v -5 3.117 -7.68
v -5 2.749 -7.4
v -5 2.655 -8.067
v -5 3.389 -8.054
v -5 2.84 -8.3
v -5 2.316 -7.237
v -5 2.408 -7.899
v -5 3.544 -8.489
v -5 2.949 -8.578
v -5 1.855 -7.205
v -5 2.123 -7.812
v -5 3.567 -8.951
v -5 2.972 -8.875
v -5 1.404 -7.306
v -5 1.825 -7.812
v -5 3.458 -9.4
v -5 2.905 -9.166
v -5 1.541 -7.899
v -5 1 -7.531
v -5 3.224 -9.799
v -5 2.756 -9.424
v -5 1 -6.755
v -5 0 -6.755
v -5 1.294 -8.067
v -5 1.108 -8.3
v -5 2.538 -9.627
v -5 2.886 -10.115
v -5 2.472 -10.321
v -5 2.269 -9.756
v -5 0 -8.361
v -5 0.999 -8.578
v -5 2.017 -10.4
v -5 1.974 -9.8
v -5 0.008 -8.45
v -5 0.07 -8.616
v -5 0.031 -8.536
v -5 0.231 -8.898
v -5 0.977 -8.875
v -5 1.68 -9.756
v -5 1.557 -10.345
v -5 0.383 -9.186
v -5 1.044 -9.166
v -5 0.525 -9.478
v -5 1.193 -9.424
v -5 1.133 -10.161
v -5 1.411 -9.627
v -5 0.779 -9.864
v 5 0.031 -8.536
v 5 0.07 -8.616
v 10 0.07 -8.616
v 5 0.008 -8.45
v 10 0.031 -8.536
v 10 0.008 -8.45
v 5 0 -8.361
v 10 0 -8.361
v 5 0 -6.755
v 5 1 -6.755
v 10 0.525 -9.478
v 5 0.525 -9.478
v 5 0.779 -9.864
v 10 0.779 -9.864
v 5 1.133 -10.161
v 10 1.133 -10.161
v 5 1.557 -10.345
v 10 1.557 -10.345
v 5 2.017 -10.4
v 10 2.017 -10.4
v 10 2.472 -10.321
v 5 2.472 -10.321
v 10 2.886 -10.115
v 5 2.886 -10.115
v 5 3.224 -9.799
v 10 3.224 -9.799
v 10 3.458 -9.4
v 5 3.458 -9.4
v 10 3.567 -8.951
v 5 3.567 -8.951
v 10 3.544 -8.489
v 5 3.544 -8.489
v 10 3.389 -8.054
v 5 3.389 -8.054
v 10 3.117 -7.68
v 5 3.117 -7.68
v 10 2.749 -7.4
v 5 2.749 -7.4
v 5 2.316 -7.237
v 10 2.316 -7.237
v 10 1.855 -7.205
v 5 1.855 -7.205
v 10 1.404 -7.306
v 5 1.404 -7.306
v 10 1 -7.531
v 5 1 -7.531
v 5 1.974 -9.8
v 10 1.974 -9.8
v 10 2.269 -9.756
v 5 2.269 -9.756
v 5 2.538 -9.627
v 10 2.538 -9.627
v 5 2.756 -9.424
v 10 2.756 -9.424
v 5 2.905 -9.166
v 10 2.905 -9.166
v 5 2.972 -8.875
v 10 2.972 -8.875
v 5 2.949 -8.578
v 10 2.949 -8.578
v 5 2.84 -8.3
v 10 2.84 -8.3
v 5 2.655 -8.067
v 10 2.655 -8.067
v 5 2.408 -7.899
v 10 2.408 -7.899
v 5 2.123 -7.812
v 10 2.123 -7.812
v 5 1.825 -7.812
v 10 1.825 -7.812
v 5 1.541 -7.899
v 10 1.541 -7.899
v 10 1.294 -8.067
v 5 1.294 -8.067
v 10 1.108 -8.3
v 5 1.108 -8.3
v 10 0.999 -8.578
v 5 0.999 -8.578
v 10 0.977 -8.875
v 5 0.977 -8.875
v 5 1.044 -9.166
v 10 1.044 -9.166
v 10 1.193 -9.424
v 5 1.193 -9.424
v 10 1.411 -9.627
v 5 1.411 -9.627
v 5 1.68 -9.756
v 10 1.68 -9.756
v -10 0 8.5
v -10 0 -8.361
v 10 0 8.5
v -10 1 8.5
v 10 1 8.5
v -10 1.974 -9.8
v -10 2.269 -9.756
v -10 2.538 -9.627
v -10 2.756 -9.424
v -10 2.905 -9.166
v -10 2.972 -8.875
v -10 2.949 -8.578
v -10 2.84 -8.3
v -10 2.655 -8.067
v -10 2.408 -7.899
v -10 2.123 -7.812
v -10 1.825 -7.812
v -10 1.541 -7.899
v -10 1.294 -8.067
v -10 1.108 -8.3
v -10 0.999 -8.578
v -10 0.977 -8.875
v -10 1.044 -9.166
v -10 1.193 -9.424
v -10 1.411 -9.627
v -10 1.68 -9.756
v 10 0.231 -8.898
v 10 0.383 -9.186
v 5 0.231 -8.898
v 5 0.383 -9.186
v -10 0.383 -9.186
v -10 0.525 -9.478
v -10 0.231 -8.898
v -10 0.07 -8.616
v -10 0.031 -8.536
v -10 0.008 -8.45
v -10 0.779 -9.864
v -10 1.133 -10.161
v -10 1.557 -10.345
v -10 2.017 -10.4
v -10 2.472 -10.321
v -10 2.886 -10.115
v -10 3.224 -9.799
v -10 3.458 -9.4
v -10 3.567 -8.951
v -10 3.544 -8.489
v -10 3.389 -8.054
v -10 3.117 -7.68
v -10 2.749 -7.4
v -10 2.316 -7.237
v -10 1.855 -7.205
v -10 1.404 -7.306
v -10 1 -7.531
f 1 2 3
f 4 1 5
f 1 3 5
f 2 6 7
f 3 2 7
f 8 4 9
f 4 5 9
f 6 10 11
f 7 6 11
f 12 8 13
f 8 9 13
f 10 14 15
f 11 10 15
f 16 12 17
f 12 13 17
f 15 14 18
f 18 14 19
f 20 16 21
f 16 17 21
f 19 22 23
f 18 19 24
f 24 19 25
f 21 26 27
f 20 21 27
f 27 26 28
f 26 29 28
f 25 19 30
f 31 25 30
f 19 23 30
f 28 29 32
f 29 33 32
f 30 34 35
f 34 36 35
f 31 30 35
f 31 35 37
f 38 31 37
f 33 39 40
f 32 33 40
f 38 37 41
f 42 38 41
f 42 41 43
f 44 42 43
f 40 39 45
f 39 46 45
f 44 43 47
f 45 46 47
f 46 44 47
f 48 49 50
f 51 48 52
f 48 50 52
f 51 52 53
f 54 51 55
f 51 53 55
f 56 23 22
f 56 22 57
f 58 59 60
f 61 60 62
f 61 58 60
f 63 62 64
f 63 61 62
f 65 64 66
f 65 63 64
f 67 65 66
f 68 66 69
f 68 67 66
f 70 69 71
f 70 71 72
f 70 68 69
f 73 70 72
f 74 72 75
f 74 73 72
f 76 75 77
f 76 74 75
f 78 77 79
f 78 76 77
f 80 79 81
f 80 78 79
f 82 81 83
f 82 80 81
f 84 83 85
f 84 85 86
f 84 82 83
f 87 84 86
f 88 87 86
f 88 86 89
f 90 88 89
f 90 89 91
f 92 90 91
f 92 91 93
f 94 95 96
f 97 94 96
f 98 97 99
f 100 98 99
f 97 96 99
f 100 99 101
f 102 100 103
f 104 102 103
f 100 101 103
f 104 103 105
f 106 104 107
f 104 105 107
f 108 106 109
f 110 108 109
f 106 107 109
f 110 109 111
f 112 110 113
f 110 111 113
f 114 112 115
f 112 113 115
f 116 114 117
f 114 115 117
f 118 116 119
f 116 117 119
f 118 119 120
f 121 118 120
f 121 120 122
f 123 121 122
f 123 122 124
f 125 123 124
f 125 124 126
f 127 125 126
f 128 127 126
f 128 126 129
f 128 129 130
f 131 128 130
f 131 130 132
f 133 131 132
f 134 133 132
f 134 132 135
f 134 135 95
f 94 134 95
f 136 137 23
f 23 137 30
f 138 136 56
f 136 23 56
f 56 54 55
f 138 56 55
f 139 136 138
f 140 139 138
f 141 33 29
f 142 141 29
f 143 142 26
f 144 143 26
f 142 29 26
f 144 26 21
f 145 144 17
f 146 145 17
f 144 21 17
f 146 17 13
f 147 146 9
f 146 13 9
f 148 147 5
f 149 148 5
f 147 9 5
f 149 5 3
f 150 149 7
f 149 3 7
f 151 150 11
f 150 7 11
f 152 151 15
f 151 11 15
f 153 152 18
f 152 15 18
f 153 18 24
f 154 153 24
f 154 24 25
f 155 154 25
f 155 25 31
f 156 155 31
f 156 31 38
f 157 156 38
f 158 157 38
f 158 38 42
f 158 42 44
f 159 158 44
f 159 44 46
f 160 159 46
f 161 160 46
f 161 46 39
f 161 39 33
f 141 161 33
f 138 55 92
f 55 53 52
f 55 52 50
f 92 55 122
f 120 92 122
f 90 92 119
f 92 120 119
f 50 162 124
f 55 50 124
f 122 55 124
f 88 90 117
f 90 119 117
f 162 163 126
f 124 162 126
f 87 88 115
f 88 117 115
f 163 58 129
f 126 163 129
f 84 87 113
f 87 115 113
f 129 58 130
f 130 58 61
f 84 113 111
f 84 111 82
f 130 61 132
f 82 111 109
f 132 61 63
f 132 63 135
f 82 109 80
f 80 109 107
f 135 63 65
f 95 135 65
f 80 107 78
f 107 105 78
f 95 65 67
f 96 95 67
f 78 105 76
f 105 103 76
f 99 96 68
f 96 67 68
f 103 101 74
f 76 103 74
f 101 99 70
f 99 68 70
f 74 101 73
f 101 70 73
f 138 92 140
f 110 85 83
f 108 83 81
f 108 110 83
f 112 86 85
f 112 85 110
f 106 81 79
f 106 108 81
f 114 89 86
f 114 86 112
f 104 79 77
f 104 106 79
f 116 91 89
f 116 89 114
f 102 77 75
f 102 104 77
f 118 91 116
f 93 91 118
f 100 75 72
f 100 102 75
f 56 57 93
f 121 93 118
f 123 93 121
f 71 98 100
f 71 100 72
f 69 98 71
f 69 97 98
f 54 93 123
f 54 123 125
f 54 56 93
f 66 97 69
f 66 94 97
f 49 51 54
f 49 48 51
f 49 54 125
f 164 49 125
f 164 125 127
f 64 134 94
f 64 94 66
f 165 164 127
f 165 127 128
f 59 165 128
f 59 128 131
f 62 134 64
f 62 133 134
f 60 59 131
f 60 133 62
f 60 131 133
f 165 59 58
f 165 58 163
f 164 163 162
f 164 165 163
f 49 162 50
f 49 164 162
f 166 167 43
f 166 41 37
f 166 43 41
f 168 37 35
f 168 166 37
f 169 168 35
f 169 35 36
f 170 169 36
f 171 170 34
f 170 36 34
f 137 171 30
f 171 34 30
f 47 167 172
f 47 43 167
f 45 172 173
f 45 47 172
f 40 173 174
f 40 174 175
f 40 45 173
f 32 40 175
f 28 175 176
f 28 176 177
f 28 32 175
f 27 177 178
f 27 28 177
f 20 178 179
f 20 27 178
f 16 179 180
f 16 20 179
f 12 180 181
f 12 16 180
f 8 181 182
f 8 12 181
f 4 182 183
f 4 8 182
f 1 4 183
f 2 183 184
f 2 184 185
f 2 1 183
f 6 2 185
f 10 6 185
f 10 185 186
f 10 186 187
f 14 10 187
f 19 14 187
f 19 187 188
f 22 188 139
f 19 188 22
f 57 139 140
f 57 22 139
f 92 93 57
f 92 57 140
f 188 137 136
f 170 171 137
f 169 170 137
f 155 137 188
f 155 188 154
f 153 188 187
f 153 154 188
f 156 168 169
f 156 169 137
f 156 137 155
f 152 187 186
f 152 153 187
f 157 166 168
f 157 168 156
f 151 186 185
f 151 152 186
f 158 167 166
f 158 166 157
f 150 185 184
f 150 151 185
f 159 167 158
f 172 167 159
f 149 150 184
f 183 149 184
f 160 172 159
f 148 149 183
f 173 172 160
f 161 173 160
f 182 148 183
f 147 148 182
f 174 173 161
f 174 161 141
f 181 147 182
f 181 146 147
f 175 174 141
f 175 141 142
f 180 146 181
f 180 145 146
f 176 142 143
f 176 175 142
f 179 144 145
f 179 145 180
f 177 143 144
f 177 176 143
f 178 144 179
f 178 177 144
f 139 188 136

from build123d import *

# Parameters (mm, degrees)
SKETCH1_W           = 20
SKETCH1_H           = 17
BOSS_EXTRUDE1_DEPTH = 1
SKETCH2_R           = 1.6
SKETCH2_R_2         = 1
BOSS_EXTRUDE2_DEPTH = 20
FILLET1_R           = 10
FILLET2_R           = 0.5
SKETCH4_W           = 10
SKETCH4_H           = 10.104734337
CUT_EXTRUDE3_DEPTH  = 15.86420015


with BuildPart() as part:
    # Sketch1 → Boss-Extrude1 (new body)
    with BuildSketch(Plane(origin=(0, 0, 0), x_dir=(1, 0, 0), z_dir=(0, 1, 0))):
        Rectangle(SKETCH1_W, SKETCH1_H)
    extrude(amount=BOSS_EXTRUDE1_DEPTH)

    # Sketch2 → Boss-Extrude2 (add)
    with BuildSketch(Plane(origin=(10, 0, 0), x_dir=(0, 0, -1), z_dir=(1, 0, 0))):
        with Locations((8.800384095, 1.974416987)):
            Circle(SKETCH2_R)
        with Locations((8.800384095, 1.974416987)):
            Circle(SKETCH2_R_2, mode=Mode.SUBTRACT)
    extrude(amount=-BOSS_EXTRUDE2_DEPTH)

    # Fillet1
    # the kernel refuses this fillet: 10 mm, written as the material it adds along each edge
    with BuildSketch(Plane(origin=(-10, 0.402866989, -8.5), x_dir=(0, -1, 0), z_dir=(1, 0, 0))) as fillet1_piece_1:
        with BuildLine():
            CenterArc((8.937605274, 5.21135706), FILLET1_R, 205.046884286, 6.361578996)
            Line((-0.12201134, 0.977759676), (-0.303203672, 0.893087728))
            ThreePointArc((-0.303203672, 0.893087728), (-0.18232452, 0.473740867), (-0.19644375, 0.037548012))
            Line((-0.19644375, 0.037548012), (0, -0.2))
            ThreePointArc((0, -0.2), (0.201433495, -0.2), (0.232172223, -0.104227141))
            Line((0.232172223, -0.104227141), (0.402866989, 0))
        make_face()
    extrude(amount=20)

    # Fillet2
    fillet2_edges = [part.edges().sort_by_distance(p)[0] for p in [
        (0, 0, -8.5),
    ]]
    fillet(fillet2_edges, radius=FILLET2_R)

    # Sketch4 → Cut-Extrude3 (cut, through all)
    with BuildSketch(Plane(origin=(0, 0, 0), x_dir=(1, 0, 0), z_dir=(0, 1, 0))):
        with Locations((0, 11.80749184)):
            Rectangle(SKETCH4_W, SKETCH4_H)
    extrude(amount=CUT_EXTRUDE3_DEPTH, mode=Mode.SUBTRACT)


solid = part.part
